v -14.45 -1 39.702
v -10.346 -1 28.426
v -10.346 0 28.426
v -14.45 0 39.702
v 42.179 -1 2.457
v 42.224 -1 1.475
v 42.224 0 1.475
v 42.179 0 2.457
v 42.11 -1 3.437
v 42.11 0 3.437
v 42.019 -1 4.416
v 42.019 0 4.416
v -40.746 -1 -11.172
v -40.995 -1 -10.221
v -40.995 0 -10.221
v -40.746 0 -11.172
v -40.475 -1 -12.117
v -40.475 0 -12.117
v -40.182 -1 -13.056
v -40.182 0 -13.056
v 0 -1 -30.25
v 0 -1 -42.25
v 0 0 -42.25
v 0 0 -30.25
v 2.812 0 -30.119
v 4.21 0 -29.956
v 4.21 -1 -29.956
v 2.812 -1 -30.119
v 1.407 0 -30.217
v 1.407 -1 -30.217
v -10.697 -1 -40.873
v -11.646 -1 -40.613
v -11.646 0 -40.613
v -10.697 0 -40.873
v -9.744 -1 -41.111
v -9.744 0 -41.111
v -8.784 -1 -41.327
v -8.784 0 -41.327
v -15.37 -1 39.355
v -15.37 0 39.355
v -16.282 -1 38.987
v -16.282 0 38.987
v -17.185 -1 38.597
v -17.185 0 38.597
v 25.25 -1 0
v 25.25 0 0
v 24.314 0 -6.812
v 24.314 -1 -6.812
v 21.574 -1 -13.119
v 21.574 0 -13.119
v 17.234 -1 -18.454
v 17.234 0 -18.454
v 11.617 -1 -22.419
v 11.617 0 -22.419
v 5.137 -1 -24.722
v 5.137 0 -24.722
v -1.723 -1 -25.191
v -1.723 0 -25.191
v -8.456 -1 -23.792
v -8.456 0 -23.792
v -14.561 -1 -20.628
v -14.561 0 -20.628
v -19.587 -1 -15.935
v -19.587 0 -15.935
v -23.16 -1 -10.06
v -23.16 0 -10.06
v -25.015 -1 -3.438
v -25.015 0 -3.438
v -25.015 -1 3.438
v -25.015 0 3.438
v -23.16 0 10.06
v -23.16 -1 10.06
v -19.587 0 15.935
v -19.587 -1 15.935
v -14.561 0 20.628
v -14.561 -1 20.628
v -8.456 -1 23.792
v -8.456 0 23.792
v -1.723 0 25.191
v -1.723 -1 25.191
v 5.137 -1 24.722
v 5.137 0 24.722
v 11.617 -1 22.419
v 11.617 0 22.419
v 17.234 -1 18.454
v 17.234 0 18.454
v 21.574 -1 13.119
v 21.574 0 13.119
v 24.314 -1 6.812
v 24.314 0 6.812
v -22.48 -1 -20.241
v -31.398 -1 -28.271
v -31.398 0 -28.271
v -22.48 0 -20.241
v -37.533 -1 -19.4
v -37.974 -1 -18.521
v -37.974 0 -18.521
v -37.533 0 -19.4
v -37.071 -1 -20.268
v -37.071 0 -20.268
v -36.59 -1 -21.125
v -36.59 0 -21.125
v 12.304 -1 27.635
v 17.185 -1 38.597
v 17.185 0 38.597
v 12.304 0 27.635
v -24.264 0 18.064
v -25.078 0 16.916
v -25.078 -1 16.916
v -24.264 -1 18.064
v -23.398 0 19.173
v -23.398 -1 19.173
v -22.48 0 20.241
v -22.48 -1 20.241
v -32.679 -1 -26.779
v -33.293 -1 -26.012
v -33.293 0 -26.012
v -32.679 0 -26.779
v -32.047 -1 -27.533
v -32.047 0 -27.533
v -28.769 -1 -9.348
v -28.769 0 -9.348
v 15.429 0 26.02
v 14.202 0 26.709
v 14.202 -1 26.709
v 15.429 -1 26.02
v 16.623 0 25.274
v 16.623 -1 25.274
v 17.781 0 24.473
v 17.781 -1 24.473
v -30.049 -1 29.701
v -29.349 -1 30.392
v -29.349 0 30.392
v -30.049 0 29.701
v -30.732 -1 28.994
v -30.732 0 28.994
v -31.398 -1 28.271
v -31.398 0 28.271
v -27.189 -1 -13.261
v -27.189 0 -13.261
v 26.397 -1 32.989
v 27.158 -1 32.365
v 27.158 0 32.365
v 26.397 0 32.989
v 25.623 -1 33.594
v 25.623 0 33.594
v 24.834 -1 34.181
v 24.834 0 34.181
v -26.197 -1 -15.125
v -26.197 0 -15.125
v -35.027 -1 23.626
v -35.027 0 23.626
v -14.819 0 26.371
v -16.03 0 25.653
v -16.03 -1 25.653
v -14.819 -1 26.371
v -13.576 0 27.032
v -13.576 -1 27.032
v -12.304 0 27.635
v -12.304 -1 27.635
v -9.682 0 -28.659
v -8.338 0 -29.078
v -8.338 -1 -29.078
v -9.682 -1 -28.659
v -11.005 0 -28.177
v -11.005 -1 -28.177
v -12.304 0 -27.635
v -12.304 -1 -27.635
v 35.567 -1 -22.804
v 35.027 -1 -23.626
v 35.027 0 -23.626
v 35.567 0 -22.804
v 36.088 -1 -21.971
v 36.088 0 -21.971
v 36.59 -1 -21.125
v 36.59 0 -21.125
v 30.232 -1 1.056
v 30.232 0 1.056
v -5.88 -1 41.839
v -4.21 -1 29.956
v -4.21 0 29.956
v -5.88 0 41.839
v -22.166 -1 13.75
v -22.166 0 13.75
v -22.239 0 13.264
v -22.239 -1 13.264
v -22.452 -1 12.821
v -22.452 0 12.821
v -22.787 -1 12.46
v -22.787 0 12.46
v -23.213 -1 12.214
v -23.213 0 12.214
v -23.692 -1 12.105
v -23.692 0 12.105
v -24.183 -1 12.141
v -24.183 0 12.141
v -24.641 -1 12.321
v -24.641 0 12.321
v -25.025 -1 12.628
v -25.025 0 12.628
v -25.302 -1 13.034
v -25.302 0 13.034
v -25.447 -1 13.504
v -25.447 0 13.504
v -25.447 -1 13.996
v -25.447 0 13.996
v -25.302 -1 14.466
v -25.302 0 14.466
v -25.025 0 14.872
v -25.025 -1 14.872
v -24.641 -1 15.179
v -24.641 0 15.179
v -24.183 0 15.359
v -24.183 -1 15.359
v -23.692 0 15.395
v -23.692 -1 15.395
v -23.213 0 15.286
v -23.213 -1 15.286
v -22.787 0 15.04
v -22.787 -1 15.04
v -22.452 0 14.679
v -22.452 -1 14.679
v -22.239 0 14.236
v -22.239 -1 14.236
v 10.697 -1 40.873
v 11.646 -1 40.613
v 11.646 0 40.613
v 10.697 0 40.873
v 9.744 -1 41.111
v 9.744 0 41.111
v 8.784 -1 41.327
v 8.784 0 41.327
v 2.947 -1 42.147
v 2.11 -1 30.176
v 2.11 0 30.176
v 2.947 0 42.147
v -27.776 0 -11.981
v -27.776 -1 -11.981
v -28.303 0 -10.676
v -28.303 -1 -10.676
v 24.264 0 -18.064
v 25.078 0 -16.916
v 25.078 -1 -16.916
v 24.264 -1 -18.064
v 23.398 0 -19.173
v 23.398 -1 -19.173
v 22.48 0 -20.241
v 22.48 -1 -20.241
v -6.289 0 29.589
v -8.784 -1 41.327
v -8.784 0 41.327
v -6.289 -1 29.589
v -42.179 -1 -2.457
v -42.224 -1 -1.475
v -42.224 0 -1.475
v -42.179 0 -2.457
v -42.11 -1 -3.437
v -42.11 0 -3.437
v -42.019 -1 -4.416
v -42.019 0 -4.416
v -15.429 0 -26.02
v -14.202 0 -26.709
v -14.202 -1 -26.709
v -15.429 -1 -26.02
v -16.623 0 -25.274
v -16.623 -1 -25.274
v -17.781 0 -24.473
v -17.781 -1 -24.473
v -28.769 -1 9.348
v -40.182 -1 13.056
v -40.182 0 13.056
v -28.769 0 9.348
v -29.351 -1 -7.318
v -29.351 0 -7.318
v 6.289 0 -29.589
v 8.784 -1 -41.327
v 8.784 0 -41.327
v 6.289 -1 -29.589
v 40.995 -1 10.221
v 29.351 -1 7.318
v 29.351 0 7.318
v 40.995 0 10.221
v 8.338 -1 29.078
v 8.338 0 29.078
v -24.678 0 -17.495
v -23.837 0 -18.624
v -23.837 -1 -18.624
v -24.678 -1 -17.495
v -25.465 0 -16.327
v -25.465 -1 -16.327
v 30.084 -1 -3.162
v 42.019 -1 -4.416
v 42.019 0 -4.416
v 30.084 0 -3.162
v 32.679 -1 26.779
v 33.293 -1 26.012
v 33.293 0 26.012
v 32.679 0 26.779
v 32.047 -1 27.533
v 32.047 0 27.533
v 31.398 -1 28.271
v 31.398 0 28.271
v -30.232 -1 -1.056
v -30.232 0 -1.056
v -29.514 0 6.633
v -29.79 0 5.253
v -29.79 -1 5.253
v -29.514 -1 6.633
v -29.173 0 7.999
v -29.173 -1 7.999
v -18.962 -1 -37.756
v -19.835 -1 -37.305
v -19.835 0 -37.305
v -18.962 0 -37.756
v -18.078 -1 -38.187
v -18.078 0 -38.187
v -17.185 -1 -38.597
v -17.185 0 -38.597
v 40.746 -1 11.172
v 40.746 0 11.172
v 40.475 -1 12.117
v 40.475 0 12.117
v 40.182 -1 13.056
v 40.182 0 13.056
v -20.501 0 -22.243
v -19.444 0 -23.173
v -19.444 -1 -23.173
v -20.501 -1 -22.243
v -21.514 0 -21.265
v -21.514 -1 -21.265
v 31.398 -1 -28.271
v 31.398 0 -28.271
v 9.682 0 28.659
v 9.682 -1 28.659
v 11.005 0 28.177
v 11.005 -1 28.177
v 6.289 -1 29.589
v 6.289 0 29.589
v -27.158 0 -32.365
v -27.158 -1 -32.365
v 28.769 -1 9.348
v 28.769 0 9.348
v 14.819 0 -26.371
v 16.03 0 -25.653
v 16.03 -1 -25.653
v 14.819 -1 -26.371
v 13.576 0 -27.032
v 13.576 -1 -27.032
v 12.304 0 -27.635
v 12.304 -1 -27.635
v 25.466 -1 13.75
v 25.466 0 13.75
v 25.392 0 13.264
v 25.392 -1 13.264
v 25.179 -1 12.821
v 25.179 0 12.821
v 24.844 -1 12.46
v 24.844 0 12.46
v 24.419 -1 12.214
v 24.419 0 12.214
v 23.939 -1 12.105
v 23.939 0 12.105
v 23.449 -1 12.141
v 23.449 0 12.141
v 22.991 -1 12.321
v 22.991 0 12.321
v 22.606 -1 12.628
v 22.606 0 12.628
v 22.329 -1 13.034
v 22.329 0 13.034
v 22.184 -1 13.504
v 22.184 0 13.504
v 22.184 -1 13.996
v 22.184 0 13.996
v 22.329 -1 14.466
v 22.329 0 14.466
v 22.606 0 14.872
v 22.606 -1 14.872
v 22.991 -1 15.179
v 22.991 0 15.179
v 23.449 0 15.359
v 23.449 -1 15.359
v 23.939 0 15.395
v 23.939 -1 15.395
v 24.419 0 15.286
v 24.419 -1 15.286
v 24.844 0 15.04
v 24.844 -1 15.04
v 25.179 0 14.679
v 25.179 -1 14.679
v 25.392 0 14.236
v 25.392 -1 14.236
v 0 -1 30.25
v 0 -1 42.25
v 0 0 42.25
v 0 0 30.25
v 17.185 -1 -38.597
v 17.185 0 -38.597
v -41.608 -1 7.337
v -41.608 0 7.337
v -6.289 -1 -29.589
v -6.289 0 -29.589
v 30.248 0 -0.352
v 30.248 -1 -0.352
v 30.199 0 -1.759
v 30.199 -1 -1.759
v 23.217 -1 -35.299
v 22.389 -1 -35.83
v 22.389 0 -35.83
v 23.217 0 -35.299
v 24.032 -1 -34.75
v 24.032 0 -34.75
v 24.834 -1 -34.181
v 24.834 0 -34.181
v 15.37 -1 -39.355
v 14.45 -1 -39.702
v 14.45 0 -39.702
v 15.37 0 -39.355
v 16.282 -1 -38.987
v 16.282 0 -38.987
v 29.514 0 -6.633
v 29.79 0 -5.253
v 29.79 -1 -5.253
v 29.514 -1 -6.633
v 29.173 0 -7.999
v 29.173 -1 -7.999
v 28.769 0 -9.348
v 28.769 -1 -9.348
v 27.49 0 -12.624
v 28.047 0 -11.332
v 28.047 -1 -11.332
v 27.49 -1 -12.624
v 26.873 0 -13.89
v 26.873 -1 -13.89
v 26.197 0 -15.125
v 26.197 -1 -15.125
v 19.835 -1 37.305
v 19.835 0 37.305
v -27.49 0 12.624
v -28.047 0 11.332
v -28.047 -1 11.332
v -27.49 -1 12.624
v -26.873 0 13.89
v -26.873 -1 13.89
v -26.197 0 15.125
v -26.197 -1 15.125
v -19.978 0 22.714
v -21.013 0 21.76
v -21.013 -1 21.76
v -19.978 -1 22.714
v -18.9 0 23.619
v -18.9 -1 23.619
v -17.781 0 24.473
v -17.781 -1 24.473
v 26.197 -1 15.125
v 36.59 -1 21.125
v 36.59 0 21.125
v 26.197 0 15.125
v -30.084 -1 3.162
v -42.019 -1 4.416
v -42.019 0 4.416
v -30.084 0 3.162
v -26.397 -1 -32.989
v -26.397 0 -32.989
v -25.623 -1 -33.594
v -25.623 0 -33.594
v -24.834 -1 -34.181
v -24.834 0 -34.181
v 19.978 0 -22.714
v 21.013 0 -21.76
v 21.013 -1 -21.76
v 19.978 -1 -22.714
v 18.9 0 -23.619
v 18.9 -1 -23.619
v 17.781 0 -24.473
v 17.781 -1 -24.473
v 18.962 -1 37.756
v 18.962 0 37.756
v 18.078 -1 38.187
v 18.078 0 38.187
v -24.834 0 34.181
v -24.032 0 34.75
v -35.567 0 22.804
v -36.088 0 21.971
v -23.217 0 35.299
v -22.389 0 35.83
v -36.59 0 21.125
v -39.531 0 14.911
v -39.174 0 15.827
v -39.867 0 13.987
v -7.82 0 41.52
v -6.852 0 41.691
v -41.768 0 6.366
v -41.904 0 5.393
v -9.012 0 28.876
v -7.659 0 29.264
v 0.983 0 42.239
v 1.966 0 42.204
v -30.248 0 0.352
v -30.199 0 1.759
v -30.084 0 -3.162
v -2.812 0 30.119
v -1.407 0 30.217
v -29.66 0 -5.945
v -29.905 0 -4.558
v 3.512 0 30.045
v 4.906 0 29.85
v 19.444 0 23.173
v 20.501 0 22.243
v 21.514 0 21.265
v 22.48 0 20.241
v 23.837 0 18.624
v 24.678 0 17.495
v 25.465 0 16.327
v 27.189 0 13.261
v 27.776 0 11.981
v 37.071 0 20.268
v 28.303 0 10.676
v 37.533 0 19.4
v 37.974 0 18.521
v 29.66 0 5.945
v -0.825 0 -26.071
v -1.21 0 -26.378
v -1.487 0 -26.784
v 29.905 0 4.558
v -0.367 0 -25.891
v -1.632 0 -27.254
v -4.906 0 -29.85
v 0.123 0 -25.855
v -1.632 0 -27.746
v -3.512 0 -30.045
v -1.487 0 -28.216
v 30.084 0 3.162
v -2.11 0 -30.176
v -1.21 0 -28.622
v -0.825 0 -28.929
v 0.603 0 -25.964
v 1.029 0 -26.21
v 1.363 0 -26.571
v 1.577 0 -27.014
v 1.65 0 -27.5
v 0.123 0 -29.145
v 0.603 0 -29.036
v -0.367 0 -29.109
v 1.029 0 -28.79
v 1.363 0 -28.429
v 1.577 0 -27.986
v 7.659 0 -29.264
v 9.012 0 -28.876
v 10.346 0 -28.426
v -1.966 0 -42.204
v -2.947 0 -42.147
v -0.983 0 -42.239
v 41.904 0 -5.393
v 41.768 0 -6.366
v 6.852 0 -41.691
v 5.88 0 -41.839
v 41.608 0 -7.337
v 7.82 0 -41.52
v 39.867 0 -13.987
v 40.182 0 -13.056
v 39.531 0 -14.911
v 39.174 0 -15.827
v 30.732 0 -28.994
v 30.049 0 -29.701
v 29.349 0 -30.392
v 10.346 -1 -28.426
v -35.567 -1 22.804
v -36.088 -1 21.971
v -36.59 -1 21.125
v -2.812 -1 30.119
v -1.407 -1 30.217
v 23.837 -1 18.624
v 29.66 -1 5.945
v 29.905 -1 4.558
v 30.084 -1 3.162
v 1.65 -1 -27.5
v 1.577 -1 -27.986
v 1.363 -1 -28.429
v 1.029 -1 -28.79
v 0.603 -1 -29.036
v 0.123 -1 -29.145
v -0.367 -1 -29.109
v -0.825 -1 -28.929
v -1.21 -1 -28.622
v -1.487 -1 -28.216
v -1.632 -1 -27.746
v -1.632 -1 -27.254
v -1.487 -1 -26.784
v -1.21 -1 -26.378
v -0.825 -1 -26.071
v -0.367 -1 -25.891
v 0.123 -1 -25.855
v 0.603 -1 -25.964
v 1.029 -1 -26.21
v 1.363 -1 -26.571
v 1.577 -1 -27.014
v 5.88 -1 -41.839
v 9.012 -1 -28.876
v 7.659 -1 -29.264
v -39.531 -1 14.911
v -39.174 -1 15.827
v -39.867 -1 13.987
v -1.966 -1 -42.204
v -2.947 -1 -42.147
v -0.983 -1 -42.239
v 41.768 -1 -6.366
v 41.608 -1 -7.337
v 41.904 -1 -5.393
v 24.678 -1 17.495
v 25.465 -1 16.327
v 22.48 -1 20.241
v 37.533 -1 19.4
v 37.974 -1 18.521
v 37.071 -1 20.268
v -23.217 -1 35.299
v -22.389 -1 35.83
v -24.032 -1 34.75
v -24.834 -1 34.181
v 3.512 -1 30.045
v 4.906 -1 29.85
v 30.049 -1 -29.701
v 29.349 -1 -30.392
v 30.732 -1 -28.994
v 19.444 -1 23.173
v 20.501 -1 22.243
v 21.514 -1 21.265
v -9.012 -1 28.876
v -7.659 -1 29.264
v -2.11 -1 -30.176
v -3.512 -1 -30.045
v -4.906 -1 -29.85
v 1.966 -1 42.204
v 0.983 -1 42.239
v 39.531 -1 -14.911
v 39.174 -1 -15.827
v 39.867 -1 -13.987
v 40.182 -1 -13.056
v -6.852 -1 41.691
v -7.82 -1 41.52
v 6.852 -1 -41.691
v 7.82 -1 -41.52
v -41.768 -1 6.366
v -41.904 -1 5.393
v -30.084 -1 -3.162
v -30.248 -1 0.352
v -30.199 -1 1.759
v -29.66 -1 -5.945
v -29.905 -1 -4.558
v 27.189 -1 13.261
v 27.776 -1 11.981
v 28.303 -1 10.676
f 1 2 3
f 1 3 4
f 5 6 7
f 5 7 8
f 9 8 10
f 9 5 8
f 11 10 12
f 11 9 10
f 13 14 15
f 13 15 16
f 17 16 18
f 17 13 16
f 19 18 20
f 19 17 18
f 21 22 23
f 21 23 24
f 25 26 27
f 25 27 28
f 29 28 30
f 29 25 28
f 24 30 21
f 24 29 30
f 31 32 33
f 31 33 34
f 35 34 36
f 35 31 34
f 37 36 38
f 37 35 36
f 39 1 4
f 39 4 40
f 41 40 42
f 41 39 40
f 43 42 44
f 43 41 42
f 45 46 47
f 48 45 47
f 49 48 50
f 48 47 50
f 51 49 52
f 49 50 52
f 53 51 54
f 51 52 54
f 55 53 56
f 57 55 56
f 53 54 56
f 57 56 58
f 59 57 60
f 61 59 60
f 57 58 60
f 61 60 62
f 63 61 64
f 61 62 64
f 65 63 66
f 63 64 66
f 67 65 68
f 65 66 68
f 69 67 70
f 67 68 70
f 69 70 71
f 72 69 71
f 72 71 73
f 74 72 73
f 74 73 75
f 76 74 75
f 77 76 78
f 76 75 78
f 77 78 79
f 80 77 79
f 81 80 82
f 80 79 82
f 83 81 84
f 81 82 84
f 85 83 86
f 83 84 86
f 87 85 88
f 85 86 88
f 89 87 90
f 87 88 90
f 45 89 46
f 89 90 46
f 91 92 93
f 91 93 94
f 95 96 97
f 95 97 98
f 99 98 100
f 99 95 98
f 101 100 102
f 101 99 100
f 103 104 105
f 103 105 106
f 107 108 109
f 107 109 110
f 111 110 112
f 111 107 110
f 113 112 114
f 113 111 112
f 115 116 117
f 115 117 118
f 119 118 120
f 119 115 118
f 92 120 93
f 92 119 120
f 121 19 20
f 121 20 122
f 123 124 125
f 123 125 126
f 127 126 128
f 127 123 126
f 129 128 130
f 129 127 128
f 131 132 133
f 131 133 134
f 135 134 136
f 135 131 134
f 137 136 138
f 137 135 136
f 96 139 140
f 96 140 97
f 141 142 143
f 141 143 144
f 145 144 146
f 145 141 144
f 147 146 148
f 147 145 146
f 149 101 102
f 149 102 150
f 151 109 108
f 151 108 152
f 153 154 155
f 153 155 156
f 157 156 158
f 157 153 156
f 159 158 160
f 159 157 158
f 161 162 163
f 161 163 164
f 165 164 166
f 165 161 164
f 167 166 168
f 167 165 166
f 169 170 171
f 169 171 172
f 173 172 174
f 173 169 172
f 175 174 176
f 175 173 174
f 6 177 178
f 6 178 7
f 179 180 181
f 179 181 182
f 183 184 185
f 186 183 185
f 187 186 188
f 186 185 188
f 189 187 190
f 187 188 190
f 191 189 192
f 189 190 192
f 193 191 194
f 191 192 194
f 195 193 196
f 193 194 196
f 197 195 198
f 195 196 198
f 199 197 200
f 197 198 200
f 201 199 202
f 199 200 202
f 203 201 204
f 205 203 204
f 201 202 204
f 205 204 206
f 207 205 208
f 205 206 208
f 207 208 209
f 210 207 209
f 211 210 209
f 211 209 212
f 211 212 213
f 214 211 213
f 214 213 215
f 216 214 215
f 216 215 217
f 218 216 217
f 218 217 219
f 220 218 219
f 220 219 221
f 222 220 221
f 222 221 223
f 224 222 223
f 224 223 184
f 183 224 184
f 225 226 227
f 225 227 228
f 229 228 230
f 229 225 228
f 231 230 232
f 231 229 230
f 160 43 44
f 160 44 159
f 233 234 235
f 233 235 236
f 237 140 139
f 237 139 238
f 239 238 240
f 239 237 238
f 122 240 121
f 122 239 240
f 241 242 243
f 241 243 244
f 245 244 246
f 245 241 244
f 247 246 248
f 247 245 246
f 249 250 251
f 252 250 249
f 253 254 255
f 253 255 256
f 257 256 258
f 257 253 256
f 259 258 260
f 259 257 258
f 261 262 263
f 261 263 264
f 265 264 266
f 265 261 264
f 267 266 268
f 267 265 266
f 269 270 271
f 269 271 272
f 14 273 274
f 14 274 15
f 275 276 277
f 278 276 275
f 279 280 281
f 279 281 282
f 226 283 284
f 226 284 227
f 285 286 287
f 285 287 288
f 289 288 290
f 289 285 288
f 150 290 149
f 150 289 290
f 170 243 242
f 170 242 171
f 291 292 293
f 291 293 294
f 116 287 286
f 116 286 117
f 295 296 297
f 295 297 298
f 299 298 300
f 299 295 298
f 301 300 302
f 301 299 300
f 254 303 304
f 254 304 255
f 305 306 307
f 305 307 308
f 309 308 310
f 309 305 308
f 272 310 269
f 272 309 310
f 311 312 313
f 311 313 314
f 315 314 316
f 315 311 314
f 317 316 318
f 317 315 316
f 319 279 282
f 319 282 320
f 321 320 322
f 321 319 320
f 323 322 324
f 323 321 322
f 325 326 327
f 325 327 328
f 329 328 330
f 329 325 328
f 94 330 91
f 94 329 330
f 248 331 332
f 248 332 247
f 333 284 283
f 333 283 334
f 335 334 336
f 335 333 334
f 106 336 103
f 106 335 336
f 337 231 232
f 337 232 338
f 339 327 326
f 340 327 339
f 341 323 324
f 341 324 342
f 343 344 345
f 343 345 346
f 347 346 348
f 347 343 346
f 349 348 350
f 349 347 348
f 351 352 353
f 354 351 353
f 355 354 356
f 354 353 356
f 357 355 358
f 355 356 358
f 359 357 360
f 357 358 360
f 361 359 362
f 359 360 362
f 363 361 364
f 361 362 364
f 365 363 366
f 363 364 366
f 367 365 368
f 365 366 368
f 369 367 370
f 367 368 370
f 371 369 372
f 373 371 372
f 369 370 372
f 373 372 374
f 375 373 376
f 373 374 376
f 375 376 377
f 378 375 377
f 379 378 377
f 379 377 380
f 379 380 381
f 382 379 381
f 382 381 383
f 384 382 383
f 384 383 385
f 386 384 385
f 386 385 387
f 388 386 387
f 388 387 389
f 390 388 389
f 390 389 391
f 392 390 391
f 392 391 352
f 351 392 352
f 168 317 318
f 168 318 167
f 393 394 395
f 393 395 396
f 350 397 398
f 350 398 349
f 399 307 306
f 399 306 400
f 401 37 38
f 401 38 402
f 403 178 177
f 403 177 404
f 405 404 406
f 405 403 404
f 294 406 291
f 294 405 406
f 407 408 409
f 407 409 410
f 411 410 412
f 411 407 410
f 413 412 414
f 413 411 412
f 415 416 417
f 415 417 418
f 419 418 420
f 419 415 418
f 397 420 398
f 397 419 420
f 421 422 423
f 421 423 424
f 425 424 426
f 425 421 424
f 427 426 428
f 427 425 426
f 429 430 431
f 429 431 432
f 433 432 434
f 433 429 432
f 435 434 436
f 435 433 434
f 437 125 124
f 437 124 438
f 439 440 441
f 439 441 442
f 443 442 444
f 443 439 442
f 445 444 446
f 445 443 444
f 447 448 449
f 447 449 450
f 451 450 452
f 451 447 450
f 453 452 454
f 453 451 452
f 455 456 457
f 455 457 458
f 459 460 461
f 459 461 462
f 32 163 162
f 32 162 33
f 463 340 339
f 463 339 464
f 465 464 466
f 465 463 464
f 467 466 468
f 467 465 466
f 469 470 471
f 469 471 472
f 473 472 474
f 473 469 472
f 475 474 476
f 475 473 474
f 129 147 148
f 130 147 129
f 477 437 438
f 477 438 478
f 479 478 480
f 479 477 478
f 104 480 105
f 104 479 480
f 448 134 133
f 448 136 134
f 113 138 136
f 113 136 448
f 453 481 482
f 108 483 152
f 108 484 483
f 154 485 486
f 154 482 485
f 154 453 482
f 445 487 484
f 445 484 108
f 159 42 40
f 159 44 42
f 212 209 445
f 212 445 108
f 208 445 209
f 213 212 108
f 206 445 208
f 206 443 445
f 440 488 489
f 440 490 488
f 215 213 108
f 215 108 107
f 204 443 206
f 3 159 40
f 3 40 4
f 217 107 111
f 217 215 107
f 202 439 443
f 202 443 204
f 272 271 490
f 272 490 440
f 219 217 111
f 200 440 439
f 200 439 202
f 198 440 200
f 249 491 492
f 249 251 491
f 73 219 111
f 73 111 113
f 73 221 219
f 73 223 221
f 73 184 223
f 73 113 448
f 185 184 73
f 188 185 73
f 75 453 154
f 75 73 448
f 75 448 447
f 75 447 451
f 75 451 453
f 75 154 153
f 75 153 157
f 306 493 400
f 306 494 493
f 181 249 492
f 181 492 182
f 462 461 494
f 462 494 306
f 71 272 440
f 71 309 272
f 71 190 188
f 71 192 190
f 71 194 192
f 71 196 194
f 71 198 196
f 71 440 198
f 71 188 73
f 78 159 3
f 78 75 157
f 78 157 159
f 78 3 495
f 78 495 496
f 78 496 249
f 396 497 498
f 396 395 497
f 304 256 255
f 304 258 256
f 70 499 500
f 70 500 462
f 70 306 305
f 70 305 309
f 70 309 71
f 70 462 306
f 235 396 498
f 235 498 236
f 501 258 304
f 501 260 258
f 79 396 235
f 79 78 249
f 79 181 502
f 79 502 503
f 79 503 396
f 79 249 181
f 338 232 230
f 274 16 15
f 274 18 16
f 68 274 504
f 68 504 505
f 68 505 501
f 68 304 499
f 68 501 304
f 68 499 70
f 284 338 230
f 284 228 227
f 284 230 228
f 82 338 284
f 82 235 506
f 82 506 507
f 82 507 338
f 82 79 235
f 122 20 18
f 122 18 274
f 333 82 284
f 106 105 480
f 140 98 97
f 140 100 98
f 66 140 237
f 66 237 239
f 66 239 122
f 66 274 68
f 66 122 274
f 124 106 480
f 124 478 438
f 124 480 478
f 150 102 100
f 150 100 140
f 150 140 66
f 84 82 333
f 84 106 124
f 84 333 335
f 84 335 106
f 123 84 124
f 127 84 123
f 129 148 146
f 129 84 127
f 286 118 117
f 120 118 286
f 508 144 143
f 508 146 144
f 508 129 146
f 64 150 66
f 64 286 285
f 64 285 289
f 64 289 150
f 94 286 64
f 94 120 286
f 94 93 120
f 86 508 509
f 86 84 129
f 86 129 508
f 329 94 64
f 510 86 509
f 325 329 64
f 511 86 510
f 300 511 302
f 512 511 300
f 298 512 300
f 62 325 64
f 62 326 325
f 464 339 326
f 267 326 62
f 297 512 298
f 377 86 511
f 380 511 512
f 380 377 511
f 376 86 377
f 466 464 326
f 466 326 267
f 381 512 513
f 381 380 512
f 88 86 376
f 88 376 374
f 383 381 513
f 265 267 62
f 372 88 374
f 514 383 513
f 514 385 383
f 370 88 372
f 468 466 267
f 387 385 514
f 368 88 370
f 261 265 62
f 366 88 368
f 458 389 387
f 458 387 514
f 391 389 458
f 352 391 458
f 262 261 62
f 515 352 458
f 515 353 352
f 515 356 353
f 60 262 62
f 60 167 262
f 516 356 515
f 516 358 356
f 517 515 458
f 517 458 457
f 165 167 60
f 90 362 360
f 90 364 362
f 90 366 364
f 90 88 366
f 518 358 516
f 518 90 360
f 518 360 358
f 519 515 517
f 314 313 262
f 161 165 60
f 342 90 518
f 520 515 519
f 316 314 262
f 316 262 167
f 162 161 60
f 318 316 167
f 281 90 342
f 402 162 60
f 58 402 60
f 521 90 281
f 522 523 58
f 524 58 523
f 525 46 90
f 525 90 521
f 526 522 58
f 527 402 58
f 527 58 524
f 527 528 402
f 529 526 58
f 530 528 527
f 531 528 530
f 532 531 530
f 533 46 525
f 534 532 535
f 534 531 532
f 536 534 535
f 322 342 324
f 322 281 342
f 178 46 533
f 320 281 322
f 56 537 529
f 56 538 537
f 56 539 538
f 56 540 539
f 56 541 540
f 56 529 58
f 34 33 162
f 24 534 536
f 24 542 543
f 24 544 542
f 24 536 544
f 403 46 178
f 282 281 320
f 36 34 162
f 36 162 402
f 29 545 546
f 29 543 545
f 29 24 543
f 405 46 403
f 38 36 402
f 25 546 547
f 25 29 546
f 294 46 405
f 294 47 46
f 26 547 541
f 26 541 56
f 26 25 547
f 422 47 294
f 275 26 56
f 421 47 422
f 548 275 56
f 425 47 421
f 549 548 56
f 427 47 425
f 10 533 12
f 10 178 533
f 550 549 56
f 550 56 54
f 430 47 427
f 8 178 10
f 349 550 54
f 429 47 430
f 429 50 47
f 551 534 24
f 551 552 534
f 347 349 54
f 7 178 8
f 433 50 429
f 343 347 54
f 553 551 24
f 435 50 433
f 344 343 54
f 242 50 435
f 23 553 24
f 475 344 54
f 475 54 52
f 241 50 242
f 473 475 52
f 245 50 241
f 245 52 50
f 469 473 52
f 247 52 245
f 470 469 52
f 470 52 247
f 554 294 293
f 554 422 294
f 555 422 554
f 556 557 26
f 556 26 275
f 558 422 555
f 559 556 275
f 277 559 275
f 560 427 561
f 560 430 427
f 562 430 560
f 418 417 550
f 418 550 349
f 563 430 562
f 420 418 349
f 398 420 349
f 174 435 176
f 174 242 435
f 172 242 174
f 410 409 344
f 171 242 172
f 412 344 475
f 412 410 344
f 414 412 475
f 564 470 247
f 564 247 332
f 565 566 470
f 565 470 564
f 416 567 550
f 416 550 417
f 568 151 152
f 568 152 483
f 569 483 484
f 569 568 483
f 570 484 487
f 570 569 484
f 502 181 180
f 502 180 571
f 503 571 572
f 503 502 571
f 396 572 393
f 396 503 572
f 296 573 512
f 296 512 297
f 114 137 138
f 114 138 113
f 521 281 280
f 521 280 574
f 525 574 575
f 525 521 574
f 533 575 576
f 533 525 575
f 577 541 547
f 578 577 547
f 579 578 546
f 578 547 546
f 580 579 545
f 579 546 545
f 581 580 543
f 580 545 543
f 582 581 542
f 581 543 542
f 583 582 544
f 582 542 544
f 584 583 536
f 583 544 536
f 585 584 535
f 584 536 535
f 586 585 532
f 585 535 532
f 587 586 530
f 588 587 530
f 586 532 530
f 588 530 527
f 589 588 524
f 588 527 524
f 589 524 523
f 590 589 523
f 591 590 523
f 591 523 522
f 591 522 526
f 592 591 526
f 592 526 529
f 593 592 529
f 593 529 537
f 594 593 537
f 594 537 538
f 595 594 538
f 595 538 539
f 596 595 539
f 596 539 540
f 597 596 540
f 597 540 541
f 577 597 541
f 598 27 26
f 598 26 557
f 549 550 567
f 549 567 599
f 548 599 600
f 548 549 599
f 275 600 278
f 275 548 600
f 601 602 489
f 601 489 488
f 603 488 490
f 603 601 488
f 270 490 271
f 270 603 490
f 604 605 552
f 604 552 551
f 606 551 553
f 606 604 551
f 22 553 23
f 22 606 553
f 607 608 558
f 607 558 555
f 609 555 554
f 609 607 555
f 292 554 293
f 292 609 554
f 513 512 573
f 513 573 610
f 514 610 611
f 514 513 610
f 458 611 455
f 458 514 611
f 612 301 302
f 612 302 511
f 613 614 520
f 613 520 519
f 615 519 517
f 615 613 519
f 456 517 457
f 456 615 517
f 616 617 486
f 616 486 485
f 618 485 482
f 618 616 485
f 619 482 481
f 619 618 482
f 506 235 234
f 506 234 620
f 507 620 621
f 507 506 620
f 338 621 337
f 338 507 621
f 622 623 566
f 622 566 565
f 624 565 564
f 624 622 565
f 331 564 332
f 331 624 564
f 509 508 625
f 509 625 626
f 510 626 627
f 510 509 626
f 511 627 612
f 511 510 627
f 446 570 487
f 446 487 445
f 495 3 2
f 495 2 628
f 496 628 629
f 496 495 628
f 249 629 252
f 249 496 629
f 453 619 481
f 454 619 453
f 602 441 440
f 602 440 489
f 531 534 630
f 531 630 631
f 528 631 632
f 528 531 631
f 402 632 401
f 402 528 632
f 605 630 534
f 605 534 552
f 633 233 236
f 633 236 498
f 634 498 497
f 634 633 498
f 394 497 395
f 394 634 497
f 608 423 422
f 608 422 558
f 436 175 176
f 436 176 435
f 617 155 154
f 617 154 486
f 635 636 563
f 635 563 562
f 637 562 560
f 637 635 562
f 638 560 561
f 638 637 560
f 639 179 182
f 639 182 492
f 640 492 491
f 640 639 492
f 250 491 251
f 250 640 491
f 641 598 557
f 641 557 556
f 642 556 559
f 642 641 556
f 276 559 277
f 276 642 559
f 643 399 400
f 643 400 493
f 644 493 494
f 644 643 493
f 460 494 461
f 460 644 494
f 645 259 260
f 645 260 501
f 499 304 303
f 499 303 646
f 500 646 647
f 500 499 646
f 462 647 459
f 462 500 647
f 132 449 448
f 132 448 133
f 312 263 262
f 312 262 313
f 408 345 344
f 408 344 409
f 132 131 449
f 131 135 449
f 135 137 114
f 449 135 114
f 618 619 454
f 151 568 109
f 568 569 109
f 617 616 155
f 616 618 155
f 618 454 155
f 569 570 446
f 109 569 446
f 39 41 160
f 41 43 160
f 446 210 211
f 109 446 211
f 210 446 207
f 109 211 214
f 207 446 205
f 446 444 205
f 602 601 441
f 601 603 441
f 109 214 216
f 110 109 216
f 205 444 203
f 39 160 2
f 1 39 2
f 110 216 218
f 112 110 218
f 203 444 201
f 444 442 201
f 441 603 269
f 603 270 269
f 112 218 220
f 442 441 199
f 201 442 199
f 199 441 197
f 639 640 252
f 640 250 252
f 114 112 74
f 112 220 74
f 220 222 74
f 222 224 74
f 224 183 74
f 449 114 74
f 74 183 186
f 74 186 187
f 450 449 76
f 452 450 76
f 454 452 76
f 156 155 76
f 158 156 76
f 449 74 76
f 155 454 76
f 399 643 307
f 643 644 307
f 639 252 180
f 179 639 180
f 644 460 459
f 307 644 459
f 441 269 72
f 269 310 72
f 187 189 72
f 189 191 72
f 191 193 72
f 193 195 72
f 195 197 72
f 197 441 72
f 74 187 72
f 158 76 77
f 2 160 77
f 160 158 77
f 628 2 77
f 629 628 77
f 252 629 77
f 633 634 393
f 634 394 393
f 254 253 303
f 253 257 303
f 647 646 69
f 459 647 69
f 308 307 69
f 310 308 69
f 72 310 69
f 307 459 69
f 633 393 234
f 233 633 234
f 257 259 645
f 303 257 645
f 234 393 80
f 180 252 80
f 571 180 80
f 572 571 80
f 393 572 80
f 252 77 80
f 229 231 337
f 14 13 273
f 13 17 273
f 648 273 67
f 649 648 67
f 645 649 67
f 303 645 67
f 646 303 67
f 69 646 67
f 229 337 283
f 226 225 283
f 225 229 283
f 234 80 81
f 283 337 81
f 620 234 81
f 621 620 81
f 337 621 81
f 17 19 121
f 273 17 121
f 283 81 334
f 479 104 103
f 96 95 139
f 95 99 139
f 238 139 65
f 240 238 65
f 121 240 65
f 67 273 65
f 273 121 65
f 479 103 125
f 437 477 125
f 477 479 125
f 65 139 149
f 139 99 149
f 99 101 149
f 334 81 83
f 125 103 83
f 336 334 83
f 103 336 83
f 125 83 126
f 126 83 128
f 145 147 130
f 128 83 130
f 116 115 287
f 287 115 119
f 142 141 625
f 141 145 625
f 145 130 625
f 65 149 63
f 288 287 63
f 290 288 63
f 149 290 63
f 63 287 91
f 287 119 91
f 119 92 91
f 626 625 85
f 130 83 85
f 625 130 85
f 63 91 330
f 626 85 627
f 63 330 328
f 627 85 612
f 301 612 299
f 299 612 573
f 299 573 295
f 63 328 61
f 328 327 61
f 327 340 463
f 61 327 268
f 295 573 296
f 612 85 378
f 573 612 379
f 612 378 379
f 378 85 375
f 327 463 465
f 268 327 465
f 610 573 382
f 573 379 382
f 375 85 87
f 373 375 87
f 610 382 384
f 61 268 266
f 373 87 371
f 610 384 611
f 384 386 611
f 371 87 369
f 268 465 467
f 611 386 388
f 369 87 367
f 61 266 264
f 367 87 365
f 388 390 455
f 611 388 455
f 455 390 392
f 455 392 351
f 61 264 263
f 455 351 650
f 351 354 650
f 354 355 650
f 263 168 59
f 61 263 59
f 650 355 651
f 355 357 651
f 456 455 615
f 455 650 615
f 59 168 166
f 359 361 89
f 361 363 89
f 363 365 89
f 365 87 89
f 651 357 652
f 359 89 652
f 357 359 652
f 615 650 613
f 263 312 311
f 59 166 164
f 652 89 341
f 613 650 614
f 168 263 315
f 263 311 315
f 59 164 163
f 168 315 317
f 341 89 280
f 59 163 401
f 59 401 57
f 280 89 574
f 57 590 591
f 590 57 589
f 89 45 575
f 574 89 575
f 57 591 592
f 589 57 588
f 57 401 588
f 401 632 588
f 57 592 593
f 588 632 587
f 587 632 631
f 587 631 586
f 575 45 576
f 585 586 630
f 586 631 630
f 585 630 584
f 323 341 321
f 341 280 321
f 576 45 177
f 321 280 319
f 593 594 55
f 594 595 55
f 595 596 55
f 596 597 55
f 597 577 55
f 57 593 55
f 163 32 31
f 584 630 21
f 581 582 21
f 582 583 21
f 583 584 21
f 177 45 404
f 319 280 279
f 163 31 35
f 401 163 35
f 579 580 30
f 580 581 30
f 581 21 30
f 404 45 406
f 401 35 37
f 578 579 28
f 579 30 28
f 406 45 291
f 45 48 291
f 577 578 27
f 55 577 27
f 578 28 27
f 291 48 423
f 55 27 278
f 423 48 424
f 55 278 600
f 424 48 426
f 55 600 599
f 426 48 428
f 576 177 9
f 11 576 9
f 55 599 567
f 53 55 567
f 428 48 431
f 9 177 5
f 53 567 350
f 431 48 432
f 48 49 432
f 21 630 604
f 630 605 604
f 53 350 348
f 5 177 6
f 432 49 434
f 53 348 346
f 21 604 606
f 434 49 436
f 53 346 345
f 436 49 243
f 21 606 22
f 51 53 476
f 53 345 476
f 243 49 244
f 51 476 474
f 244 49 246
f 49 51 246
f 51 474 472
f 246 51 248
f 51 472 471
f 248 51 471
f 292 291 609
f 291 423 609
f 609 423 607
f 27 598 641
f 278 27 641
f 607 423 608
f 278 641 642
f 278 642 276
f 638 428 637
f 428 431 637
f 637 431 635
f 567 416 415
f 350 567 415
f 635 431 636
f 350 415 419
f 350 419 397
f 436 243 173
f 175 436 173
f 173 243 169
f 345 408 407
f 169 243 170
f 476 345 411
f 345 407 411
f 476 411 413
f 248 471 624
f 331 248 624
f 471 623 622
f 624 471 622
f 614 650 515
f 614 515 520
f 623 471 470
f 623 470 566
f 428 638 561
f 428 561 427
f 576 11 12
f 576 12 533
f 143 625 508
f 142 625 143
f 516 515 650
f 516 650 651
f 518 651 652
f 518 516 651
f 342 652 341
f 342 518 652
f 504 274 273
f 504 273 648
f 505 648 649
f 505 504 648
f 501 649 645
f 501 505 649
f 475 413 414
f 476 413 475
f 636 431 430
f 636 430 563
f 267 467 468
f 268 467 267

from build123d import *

# Parameters (mm, degrees)
SKETCH1_R           = 30.25
SKETCH1_R_2         = 25.25
EXTRUDE_THIN1_DEPTH = 1
SKETCH2_R           = 1.65
CUT_EXTRUDE3_DEPTH  = 10
BOSS_EXTRUDE1_DEPTH = 1


with BuildPart() as part:
    # Sketch1 → Extrude-Thin1 (new body)
    with BuildSketch(Plane(origin=(0, 0, 0), x_dir=(1, 0, 0), z_dir=(0, 1, 0))):
        Circle(SKETCH1_R)
        Circle(SKETCH1_R_2, mode=Mode.SUBTRACT)
    extrude(amount=-EXTRUDE_THIN1_DEPTH)

    # Sketch2 → Cut-Extrude3 (cut)
    with BuildSketch(Plane(origin=(0, 0, 0), x_dir=(1, 0, 0), z_dir=(0, 1, 0))):
        with Locations((0, 27.5)):
            Circle(SKETCH2_R)
        with Locations((23.815698604, -13.75)):
            Circle(SKETCH2_R)
        with Locations((-23.815698604, -13.75)):
            Circle(SKETCH2_R)
    extrude(amount=-CUT_EXTRUDE3_DEPTH, mode=Mode.SUBTRACT)

    # Sketch5 → Boss-Extrude1 (add)
    with BuildSketch(Plane.XZ.offset(1)):
        with BuildLine():
            Line((0, 42.25), (0, 30.25))
            ThreePointArc((0, 30.25), (1.055709775, 30.231572517), (2.110133331, 30.17631252))
            Line((2.110133331, 30.17631252), (2.947211016, 42.147081123))
            ThreePointArc((2.947211016, 42.147081123), (1.474503736, 42.224262442), (0, 42.25))
        make_face()
        with BuildLine():
            Line((8.784268937, 41.326736131), (6.289328647, 29.588964922))
            ThreePointArc((6.289328647, 29.588964922), (7.318137342, 29.35144572), (8.338030013, 29.078166302))
            Line((8.338030013, 29.078166302), (11.645678283, 40.613306653))
            ThreePointArc((11.645678283, 40.613306653), (10.221200089, 40.994994435), (8.784268937, 41.326736131))
        make_face()
        with BuildLine():
            Line((17.18462317, 38.597295585), (12.303783453, 27.634750094))
            ThreePointArc((12.303783453, 27.634750094), (13.26072719, 27.188519901), (14.201514774, 26.709164684))
            Line((14.201514774, 26.709164684), (19.835173528, 37.304535798))
            ThreePointArc((19.835173528, 37.304535798), (18.521180952, 37.974048456), (17.18462317, 38.597295585))
        make_face()
        with BuildLine():
            Line((24.833926909, 34.180968012), (17.780503882, 24.47276408))
            ThreePointArc((17.780503882, 24.47276408), (18.623759629, 23.837325297), (19.444325193, 23.172844404))
            Line((19.444325193, 23.172844404), (27.157776509, 32.365377722))
            ThreePointArc((27.157776509, 32.365377722), (26.011697333, 33.29345434), (24.833926909, 34.180968012))
        make_face()
        with BuildLine():
            Line((31.397868876, 28.270768119), (22.480130971, 20.241200842))
            ThreePointArc((22.480130971, 20.241200842), (23.172844404, 19.444325193), (23.837325297, 18.623759629))
            Line((23.837325297, 18.623759629), (33.29345434, 26.011697333))
            ThreePointArc((33.29345434, 26.011697333), (32.365377722, 27.157776509), (31.397868876, 28.270768119))
        make_face()
        with BuildLine():
            Line((36.58957331, 21.125), (26.197268464, 15.125))
            ThreePointArc((26.197268464, 15.125), (26.709164684, 14.201514774), (27.188519901, 13.26072719))
            Line((27.188519901, 13.26072719), (37.974048456, 18.521180952))
            ThreePointArc((37.974048456, 18.521180952), (37.304535798, 19.835173528), (36.58957331, 21.125))
        make_face()
        with BuildLine():
            Line((40.182137813, 13.055968012), (28.769459618, 9.34776408))
            ThreePointArc((28.769459618, 9.34776408), (29.078166302, 8.338030013), (29.35144572, 7.318137342))
            Line((29.35144572, 7.318137342), (40.994994435, 10.221200089))
            ThreePointArc((40.994994435, 10.221200089), (40.613306653, 11.645678283), (40.182137813, 13.055968012))
        make_face()
        with BuildLine():
            Line((42.018550079, 4.416327573), (30.084287335, 3.161986014))
            ThreePointArc((30.084287335, 3.161986014), (30.17631252, 2.110133331), (30.231572517, 1.055709775))
            Line((30.231572517, 1.055709775), (42.224262442, 1.474503736))
            ThreePointArc((42.224262442, 1.474503736), (42.147081123, 2.947211016), (42.018550079, 4.416327573))
        make_face()
        with BuildLine():
            Line((42.018550079, -4.416327573), (30.084287335, -3.161986014))
            ThreePointArc((30.084287335, -3.161986014), (29.955609079, -4.209986304), (29.790434529, -5.252857374))
            Line((29.790434529, -5.252857374), (41.608127565, -7.336635506))
            ThreePointArc((41.608127565, -7.336635506), (41.838825904, -5.880063516), (42.018550079, -4.416327573))
        make_face()
        with BuildLine():
            Line((40.182137813, -13.055968012), (28.769459618, -9.34776408))
            ThreePointArc((28.769459618, -9.34776408), (28.425701779, -10.346109336), (28.047311601, -11.331849451))
            Line((28.047311601, -11.331849451), (39.173517855, -15.827128572))
            ThreePointArc((39.173517855, -15.827128572), (39.702013228, -14.450351056), (40.182137813, -13.055968012))
        make_face()
        with BuildLine():
            Line((36.58957331, -21.125), (26.197268464, -15.125))
            ThreePointArc((26.197268464, -15.125), (25.653454909, -16.030057743), (25.07838657, -16.91558533))
            Line((25.07838657, -16.91558533), (35.02683744, -23.625900172))
            ThreePointArc((35.02683744, -23.625900172), (35.830032063, -22.389088914), (36.58957331, -21.125))
        make_face()
        with BuildLine():
            Line((31.397868876, -28.270768119), (22.480130971, -20.241200842))
            ThreePointArc((22.480130971, -20.241200842), (21.76002896, -21.013415706), (21.013415706, -21.76002896))
            Line((21.013415706, -21.76002896), (29.349316152, -30.392106564))
            ThreePointArc((29.349316152, -30.392106564), (30.392106564, -29.349316152), (31.397868876, -28.270768119))
        make_face()
        with BuildLine():
            Line((24.833926909, -34.180968012), (17.780503882, -24.47276408))
            ThreePointArc((17.780503882, -24.47276408), (16.91558533, -25.07838657), (16.030057743, -25.653454909))
            Line((16.030057743, -25.653454909), (22.389088914, -35.830032063))
            ThreePointArc((22.389088914, -35.830032063), (23.625900172, -35.02683744), (24.833926909, -34.180968012))
        make_face()
        with BuildLine():
            Line((17.18462317, -38.597295585), (12.303783453, -27.634750094))
            ThreePointArc((12.303783453, -27.634750094), (11.331849451, -28.047311601), (10.346109336, -28.425701779))
            Line((10.346109336, -28.425701779), (14.450351056, -39.702013228))
            ThreePointArc((14.450351056, -39.702013228), (15.827128572, -39.173517855), (17.18462317, -38.597295585))
        make_face()
        with BuildLine():
            Line((8.784268937, -41.326736131), (6.289328647, -29.588964922))
            ThreePointArc((6.289328647, -29.588964922), (5.252857374, -29.790434529), (4.209986304, -29.955609079))
            Line((4.209986304, -29.955609079), (5.880063516, -41.838825904))
            ThreePointArc((5.880063516, -41.838825904), (7.336635506, -41.608127565), (8.784268937, -41.326736131))
        make_face()
        with BuildLine():
            Line((0, -42.25), (0, -30.25))
            ThreePointArc((0, -30.25), (-1.055709775, -30.231572517), (-2.110133331, -30.17631252))
            Line((-2.110133331, -30.17631252), (-2.947211016, -42.147081123))
            ThreePointArc((-2.947211016, -42.147081123), (-1.474503736, -42.224262442), (0, -42.25))
        make_face()
        with BuildLine():
            Line((-8.784268937, -41.326736131), (-6.289328647, -29.588964922))
            ThreePointArc((-6.289328647, -29.588964922), (-7.318137342, -29.35144572), (-8.338030013, -29.078166302))
            Line((-8.338030013, -29.078166302), (-11.645678283, -40.613306653))
            ThreePointArc((-11.645678283, -40.613306653), (-10.221200089, -40.994994435), (-8.784268937, -41.326736131))
        make_face()
        with BuildLine():
            Line((-17.18462317, -38.597295585), (-12.303783453, -27.634750094))
            ThreePointArc((-12.303783453, -27.634750094), (-13.26072719, -27.188519901), (-14.201514774, -26.709164684))
            Line((-14.201514774, -26.709164684), (-19.835173528, -37.304535798))
            ThreePointArc((-19.835173528, -37.304535798), (-18.521180952, -37.974048456), (-17.18462317, -38.597295585))
        make_face()
        with BuildLine():
            Line((-24.833926909, -34.180968012), (-17.780503882, -24.47276408))
            ThreePointArc((-17.780503882, -24.47276408), (-18.623759629, -23.837325297), (-19.444325193, -23.172844404))
            Line((-19.444325193, -23.172844404), (-27.157776509, -32.365377722))
            ThreePointArc((-27.157776509, -32.365377722), (-26.011697333, -33.29345434), (-24.833926909, -34.180968012))
        make_face()
        with BuildLine():
            Line((-31.397868876, -28.270768119), (-22.480130971, -20.241200842))
            ThreePointArc((-22.480130971, -20.241200842), (-23.172844404, -19.444325193), (-23.837325297, -18.623759629))
            Line((-23.837325297, -18.623759629), (-33.29345434, -26.011697333))
            ThreePointArc((-33.29345434, -26.011697333), (-32.365377722, -27.157776509), (-31.397868876, -28.270768119))
        make_face()
        with BuildLine():
            Line((-36.58957331, -21.125), (-26.197268464, -15.125))
            ThreePointArc((-26.197268464, -15.125), (-26.709164684, -14.201514774), (-27.188519901, -13.26072719))
            Line((-27.188519901, -13.26072719), (-37.974048456, -18.521180952))
            ThreePointArc((-37.974048456, -18.521180952), (-37.304535798, -19.835173528), (-36.58957331, -21.125))
        make_face()
        with BuildLine():
            Line((-40.182137813, -13.055968012), (-28.769459618, -9.34776408))
            ThreePointArc((-28.769459618, -9.34776408), (-29.078166302, -8.338030013), (-29.35144572, -7.318137342))
            Line((-29.35144572, -7.318137342), (-40.994994435, -10.221200089))
            ThreePointArc((-40.994994435, -10.221200089), (-40.613306653, -11.645678283), (-40.182137813, -13.055968012))
        make_face()
        with BuildLine():
            Line((-42.018550079, -4.416327573), (-30.084287335, -3.161986014))
            ThreePointArc((-30.084287335, -3.161986014), (-30.17631252, -2.110133331), (-30.231572517, -1.055709775))
            Line((-30.231572517, -1.055709775), (-42.224262442, -1.474503736))
            ThreePointArc((-42.224262442, -1.474503736), (-42.147081123, -2.947211016), (-42.018550079, -4.416327573))
        make_face()
        with BuildLine():
            Line((-42.018550079, 4.416327573), (-30.084287335, 3.161986014))
            ThreePointArc((-30.084287335, 3.161986014), (-29.955609079, 4.209986304), (-29.790434529, 5.252857374))
            Line((-29.790434529, 5.252857374), (-41.608127565, 7.336635506))
            ThreePointArc((-41.608127565, 7.336635506), (-41.838825904, 5.880063516), (-42.018550079, 4.416327573))
        make_face()
        with BuildLine():
            Line((-40.182137813, 13.055968012), (-28.769459618, 9.34776408))
            ThreePointArc((-28.769459618, 9.34776408), (-28.425701779, 10.346109336), (-28.047311601, 11.331849451))
            Line((-28.047311601, 11.331849451), (-39.173517855, 15.827128572))
            ThreePointArc((-39.173517855, 15.827128572), (-39.702013228, 14.450351056), (-40.182137813, 13.055968012))
        make_face()
        with BuildLine():
            Line((-36.58957331, 21.125), (-26.197268464, 15.125))
            ThreePointArc((-26.197268464, 15.125), (-25.653454909, 16.030057743), (-25.07838657, 16.91558533))
            Line((-25.07838657, 16.91558533), (-35.02683744, 23.625900172))
            ThreePointArc((-35.02683744, 23.625900172), (-35.830032063, 22.389088914), (-36.58957331, 21.125))
        make_face()
        with BuildLine():
            Line((-31.397868876, 28.270768119), (-22.480130971, 20.241200842))
            ThreePointArc((-22.480130971, 20.241200842), (-21.76002896, 21.013415706), (-21.013415706, 21.76002896))
            Line((-21.013415706, 21.76002896), (-29.349316152, 30.392106564))
            ThreePointArc((-29.349316152, 30.392106564), (-30.392106564, 29.349316152), (-31.397868876, 28.270768119))
        make_face()
        with BuildLine():
            Line((-24.833926909, 34.180968012), (-17.780503882, 24.47276408))
            ThreePointArc((-17.780503882, 24.47276408), (-16.91558533, 25.07838657), (-16.030057743, 25.653454909))
            Line((-16.030057743, 25.653454909), (-22.389088914, 35.830032063))
            ThreePointArc((-22.389088914, 35.830032063), (-23.625900172, 35.02683744), (-24.833926909, 34.180968012))
        make_face()
        with BuildLine():
            Line((-17.18462317, 38.597295585), (-12.303783453, 27.634750094))
            ThreePointArc((-12.303783453, 27.634750094), (-11.331849451, 28.047311601), (-10.346109336, 28.425701779))
            Line((-10.346109336, 28.425701779), (-14.450351056, 39.702013228))
            ThreePointArc((-14.450351056, 39.702013228), (-15.827128572, 39.173517855), (-17.18462317, 38.597295585))
        make_face()
        with BuildLine():
            Line((-8.784268937, 41.326736131), (-6.289328647, 29.588964922))
            ThreePointArc((-6.289328647, 29.588964922), (-5.252857374, 29.790434529), (-4.209986304, 29.955609079))
            Line((-4.209986304, 29.955609079), (-5.880063516, 41.838825904))
            ThreePointArc((-5.880063516, 41.838825904), (-7.336635506, 41.608127565), (-8.784268937, 41.326736131))
        make_face()
    extrude(amount=-BOSS_EXTRUDE1_DEPTH)


solid = part.part
